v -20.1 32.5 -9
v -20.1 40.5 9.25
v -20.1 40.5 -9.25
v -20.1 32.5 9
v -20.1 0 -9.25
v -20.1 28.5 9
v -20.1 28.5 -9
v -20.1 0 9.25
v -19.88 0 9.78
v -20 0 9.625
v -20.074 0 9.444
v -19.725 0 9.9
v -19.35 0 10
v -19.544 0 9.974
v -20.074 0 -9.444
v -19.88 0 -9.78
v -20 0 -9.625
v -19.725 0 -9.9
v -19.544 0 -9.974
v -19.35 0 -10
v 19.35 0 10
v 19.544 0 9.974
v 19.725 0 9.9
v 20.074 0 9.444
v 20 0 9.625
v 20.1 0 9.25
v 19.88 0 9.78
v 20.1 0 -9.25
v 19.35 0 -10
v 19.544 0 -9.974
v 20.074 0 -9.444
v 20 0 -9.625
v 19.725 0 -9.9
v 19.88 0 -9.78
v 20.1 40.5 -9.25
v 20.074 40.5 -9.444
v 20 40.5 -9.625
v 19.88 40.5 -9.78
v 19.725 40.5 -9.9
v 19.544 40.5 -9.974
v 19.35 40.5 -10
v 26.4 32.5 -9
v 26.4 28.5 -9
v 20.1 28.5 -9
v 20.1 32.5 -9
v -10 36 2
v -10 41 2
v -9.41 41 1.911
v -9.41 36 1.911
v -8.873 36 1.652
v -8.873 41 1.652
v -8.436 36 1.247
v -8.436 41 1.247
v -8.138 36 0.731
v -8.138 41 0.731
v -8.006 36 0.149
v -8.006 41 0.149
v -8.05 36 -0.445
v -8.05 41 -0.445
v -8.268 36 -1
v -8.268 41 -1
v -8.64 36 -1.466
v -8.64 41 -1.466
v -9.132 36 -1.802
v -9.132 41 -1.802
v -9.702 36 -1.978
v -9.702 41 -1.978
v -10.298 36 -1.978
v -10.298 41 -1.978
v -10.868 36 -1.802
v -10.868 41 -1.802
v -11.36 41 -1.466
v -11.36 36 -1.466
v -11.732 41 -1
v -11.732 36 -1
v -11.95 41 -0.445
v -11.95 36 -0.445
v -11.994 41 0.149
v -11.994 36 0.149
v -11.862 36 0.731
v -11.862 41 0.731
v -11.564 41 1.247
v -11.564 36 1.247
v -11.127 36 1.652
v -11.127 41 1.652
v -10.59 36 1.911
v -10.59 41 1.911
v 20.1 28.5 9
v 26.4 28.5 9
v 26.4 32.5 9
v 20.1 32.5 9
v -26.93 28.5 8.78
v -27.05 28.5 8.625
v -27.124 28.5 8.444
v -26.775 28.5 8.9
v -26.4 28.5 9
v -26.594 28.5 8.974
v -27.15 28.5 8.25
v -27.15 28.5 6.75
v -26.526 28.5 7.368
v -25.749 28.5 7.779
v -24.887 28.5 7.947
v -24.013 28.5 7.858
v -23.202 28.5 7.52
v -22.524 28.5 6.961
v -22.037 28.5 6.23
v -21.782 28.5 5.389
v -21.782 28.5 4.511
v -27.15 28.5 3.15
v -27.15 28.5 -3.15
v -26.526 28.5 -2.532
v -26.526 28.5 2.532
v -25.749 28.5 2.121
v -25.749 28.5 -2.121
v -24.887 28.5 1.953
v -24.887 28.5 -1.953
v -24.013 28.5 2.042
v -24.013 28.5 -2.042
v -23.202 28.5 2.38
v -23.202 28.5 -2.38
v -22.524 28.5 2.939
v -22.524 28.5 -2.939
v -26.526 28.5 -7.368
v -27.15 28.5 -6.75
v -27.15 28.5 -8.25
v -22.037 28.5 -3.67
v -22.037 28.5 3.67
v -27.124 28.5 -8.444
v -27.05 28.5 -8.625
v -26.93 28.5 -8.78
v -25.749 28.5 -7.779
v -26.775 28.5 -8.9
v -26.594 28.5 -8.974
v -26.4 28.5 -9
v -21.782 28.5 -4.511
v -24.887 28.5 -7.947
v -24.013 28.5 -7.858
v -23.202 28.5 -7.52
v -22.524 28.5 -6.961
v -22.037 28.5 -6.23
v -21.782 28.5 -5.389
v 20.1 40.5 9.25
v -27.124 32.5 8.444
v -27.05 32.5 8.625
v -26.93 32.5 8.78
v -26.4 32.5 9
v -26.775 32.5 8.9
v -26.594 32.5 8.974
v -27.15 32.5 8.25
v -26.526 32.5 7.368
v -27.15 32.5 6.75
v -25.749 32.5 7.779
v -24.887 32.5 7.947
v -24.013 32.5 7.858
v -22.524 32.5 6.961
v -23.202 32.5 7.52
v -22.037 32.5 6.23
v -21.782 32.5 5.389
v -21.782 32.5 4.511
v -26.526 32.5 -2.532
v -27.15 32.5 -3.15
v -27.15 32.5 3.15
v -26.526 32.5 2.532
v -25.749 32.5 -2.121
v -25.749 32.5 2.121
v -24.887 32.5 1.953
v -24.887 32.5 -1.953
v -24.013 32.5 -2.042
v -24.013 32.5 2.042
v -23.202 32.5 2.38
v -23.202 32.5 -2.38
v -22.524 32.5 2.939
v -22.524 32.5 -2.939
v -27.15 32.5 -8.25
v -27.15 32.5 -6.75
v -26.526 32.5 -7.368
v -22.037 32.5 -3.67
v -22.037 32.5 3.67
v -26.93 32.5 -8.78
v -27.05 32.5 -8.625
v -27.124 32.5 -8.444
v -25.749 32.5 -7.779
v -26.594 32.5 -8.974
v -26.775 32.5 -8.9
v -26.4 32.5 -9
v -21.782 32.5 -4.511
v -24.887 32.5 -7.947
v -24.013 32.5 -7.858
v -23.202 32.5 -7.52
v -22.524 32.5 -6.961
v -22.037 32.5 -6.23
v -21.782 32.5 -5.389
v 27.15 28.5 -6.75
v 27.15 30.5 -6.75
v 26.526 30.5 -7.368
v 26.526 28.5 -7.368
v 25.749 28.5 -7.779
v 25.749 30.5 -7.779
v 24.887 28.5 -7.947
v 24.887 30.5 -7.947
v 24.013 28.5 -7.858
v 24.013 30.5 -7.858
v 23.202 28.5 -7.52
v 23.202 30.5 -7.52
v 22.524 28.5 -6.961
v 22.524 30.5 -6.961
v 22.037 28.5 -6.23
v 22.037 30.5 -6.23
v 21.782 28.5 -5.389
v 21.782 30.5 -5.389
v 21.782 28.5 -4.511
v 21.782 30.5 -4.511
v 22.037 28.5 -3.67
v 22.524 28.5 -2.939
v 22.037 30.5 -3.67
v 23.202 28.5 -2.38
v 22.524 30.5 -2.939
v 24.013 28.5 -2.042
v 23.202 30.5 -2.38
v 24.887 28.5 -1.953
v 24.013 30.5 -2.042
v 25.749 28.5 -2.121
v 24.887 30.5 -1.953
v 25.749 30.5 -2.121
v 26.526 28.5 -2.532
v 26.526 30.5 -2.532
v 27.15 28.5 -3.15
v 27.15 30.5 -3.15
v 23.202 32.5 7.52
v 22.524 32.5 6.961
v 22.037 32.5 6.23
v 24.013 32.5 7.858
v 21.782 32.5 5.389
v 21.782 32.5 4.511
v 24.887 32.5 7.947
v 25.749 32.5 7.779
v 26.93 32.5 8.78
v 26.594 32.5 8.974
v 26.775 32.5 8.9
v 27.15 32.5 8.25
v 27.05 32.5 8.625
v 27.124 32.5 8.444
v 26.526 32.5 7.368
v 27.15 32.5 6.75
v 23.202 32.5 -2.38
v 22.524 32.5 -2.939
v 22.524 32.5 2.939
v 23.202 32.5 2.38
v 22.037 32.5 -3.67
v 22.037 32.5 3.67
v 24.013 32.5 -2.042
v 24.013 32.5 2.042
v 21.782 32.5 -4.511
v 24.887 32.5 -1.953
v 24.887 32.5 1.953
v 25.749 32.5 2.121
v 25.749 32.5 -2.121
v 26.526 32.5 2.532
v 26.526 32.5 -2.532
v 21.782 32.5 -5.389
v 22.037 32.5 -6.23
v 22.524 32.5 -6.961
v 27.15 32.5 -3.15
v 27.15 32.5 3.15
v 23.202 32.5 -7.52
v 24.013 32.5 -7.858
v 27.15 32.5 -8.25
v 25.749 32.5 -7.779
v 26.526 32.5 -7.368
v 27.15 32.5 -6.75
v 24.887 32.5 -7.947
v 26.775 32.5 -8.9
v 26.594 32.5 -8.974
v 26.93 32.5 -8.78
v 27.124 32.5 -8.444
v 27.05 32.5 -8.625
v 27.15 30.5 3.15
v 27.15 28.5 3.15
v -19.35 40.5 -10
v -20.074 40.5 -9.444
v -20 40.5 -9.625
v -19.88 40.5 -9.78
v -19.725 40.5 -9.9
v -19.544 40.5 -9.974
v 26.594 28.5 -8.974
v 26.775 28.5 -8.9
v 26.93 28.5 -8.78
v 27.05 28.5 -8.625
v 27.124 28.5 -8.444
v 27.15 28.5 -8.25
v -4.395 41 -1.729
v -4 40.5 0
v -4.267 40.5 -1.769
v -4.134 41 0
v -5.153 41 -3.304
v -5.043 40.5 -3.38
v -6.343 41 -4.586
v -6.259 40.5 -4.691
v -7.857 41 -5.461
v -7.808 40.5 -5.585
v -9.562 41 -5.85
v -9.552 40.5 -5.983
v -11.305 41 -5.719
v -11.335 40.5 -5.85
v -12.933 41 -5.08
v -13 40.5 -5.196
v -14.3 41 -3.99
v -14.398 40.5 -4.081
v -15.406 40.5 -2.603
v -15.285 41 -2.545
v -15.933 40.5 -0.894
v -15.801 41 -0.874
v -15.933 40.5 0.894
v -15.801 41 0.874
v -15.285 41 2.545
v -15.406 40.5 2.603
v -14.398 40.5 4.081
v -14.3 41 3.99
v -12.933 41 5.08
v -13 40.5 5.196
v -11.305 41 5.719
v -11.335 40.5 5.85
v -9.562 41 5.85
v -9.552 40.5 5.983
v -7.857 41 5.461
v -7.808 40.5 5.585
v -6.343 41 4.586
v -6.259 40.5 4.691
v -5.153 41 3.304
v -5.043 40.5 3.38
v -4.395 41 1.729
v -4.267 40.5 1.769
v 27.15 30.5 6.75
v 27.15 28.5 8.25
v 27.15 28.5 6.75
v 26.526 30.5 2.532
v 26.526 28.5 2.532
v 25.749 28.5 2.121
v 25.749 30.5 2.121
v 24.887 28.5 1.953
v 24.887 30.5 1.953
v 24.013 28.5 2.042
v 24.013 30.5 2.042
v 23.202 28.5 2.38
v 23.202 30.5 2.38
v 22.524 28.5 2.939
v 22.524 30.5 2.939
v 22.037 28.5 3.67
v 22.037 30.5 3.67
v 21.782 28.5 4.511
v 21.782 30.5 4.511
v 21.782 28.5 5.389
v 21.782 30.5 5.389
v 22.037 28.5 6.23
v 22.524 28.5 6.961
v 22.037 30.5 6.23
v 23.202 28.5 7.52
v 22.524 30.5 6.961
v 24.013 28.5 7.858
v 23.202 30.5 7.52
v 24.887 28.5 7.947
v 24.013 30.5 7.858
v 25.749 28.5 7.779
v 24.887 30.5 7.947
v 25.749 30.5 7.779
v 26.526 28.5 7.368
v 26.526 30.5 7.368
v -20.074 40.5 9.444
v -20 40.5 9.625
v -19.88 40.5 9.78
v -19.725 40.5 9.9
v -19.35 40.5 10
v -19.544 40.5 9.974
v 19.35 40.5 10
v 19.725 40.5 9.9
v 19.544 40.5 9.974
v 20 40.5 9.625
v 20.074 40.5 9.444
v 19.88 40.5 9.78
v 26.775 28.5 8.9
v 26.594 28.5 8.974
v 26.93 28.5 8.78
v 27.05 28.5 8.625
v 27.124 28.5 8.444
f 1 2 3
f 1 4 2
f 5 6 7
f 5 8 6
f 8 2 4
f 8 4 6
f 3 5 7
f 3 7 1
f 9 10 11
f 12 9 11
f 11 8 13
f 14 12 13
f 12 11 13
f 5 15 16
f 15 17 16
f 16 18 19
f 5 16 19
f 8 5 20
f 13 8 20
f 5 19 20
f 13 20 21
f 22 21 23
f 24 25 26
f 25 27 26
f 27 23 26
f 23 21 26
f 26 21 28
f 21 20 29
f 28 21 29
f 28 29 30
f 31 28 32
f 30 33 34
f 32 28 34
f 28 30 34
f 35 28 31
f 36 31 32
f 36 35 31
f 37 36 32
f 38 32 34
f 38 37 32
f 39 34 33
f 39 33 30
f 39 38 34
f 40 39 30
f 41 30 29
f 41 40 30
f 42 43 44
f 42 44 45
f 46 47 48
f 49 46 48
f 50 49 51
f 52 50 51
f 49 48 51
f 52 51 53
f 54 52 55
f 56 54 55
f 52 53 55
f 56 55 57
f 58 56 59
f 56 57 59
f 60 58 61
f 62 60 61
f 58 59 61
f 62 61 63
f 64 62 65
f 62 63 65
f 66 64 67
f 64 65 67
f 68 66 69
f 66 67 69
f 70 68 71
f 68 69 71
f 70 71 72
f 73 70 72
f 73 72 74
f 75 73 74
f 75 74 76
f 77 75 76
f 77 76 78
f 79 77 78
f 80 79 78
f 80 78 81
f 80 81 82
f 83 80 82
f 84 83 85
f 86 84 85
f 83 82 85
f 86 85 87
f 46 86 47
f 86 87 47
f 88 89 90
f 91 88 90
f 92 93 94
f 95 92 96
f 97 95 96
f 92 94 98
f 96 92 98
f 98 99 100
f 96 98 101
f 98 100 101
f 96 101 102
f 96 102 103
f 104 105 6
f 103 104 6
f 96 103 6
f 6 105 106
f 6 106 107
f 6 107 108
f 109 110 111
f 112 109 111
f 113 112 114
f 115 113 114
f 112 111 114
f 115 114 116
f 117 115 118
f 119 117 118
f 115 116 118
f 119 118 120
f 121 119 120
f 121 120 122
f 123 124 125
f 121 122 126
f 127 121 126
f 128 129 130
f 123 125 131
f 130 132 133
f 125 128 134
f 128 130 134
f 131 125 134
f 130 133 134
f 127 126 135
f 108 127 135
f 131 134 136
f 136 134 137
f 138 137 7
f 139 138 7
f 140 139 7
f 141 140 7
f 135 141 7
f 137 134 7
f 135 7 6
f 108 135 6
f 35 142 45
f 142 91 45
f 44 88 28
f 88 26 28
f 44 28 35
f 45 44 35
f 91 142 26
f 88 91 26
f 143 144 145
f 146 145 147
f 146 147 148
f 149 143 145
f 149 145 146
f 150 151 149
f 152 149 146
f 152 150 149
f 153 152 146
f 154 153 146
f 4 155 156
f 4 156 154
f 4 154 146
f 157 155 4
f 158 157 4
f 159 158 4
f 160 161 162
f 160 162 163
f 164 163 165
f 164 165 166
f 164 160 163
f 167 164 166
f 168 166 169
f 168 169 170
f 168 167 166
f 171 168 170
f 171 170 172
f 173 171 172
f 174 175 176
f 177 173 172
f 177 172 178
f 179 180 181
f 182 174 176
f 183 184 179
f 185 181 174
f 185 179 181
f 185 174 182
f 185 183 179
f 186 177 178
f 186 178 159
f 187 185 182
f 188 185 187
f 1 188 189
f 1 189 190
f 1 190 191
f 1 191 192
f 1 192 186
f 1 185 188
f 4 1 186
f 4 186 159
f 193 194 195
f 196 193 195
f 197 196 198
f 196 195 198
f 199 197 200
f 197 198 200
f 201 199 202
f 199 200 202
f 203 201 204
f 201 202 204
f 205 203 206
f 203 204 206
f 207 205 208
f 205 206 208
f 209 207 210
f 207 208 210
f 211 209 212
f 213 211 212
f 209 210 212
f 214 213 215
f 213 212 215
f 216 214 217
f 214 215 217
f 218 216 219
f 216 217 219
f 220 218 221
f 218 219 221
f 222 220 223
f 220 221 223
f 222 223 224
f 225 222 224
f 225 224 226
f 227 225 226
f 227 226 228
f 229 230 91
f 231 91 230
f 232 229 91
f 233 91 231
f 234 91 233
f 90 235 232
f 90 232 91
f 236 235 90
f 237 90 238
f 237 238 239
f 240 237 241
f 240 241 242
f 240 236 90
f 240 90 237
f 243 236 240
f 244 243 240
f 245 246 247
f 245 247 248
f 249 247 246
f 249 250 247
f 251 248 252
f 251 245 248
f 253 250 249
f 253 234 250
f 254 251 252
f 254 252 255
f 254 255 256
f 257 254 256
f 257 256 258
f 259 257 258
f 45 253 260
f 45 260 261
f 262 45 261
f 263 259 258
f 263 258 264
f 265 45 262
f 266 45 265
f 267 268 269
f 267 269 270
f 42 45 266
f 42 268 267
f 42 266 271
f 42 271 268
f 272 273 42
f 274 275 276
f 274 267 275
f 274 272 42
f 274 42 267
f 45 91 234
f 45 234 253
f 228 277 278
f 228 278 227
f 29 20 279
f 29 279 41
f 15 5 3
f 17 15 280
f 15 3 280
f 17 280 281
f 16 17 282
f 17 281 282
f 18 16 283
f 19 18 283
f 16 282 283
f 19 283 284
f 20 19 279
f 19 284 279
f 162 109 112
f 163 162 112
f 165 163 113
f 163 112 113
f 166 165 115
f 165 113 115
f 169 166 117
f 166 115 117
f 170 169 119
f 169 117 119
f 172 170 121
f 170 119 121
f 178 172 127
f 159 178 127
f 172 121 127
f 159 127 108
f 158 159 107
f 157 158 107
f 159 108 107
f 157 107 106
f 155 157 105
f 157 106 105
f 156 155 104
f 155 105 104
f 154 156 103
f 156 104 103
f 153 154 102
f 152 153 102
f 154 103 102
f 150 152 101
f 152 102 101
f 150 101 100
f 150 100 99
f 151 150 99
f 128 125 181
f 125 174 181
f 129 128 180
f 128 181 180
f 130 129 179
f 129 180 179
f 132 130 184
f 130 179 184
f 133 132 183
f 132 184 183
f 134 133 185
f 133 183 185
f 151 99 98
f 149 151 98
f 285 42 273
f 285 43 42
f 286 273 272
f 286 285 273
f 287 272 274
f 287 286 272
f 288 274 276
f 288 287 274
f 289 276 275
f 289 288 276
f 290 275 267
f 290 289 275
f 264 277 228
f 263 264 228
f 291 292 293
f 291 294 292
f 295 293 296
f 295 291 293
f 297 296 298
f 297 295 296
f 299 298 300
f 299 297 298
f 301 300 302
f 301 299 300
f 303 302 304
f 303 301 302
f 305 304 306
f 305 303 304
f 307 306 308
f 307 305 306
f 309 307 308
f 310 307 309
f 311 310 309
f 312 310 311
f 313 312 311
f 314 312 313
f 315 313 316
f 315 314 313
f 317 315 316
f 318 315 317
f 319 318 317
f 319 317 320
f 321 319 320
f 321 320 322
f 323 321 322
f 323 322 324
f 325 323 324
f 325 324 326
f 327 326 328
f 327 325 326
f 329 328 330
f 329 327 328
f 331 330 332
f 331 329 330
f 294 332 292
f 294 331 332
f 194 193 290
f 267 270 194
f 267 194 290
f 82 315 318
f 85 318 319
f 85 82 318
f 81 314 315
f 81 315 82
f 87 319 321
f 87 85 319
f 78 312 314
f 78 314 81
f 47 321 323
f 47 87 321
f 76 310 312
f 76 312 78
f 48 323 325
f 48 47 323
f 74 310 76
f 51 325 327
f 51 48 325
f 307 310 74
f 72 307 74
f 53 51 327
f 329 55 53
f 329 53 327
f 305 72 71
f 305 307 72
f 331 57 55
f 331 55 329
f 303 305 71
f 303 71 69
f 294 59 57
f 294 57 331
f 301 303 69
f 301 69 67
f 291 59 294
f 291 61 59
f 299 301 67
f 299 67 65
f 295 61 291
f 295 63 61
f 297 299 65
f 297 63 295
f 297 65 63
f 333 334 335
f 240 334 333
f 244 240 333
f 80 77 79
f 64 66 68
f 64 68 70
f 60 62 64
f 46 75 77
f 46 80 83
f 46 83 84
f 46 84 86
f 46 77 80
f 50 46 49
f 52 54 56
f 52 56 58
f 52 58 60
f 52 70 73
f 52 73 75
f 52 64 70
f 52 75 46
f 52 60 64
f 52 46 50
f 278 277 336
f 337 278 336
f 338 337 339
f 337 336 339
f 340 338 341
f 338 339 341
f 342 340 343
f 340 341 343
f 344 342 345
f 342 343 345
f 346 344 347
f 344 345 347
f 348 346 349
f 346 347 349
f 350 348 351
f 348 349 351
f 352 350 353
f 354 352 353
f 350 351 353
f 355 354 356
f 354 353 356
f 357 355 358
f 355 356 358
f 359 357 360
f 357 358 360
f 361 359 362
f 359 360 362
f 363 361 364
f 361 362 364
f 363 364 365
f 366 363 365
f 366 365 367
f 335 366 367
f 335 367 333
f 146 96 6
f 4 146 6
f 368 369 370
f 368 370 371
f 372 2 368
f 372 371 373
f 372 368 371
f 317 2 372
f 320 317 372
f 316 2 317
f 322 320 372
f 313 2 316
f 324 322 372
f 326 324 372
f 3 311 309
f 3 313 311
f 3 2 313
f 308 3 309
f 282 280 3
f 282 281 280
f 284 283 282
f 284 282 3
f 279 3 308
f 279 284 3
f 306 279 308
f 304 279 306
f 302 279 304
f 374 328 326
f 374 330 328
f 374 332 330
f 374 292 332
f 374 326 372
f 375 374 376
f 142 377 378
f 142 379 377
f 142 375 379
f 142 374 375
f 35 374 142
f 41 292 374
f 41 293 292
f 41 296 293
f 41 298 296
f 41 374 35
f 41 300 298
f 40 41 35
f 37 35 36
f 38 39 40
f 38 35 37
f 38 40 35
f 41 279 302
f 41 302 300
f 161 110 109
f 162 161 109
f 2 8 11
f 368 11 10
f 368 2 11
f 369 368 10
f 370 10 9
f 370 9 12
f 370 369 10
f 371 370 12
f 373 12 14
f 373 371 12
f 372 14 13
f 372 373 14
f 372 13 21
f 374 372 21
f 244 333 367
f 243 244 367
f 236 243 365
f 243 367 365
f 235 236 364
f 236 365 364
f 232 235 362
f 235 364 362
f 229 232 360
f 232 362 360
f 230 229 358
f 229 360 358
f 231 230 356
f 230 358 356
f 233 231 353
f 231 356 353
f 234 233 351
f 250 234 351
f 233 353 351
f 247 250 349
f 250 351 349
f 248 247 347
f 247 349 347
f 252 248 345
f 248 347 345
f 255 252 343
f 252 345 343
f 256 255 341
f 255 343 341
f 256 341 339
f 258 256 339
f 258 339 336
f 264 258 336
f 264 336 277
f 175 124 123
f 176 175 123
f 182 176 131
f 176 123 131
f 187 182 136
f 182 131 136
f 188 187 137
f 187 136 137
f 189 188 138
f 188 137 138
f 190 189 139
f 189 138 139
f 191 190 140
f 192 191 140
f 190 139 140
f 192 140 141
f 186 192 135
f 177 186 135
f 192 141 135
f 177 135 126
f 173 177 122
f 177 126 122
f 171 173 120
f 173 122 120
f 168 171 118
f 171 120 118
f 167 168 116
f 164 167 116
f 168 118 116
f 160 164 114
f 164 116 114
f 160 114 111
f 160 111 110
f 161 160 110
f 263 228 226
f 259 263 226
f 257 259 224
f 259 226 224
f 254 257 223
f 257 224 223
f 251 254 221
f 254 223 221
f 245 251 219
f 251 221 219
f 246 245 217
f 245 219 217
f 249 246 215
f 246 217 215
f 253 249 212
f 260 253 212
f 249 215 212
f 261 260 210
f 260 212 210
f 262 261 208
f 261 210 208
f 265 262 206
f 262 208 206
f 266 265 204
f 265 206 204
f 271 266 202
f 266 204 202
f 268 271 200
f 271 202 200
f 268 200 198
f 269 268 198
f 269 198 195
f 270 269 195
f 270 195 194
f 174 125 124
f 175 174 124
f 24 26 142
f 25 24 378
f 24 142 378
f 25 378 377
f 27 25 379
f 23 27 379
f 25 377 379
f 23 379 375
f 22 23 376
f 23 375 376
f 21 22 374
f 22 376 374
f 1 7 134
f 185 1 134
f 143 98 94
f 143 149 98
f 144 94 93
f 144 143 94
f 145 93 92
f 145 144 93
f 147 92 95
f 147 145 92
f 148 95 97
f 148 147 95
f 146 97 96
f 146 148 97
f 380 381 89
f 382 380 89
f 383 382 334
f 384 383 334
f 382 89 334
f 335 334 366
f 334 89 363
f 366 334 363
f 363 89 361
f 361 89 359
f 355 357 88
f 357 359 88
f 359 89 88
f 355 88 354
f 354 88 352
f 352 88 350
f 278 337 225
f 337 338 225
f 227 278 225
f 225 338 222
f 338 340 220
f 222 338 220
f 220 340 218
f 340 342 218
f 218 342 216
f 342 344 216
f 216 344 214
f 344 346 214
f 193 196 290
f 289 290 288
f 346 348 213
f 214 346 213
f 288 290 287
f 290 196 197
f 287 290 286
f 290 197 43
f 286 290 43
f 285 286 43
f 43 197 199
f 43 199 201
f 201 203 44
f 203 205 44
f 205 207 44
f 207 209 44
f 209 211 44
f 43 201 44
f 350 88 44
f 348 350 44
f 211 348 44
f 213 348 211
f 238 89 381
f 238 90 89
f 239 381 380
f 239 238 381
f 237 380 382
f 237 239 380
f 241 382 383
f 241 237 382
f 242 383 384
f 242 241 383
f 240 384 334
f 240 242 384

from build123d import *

# Parameters (mm, degrees)
SKETCH1_W           = 40.2
SKETCH1_H           = 20
BOSS_EXTRUDE1_DEPTH = 40.5
SKETCH2_W           = 18
SKETCH2_H           = 2
BOSS_EXTRUDE2_DEPTH = 7.05
SKETCH5_R           = 3
CUT_EXTRUDE1_DEPTH  = 7.05
MIRROR2_START       = 28.5
MIRROR2_DEPTH       = 4
FILLET2_R           = 0.75
SKETCH6_R           = 6
BOSS_EXTRUDE3_DEPTH = 0.5
BOSS_EXTRUDE3_TAPER = 15
SKETCH7_R           = 2
CUT_EXTRUDE3_DEPTH  = 5


# Read off the part's stored shape, not the designer's step: Mirror2
with BuildPart() as part:
    # Sketch1 → Boss-Extrude1 (new body)
    with BuildSketch(Plane(origin=(0, 0, 0), x_dir=(1, 0, 0), z_dir=(0, 1, 0))):
        Rectangle(SKETCH1_W, SKETCH1_H)
    extrude(amount=BOSS_EXTRUDE1_DEPTH)

    # Sketch2 → Boss-Extrude2 (add)
    with BuildSketch(Plane(origin=(20.1, 0, 0), x_dir=(0, 0, -1), z_dir=(1, 0, 0))):
        with Locations((0, 29.5)):
            Rectangle(SKETCH2_W, SKETCH2_H)
    extrude(amount=BOSS_EXTRUDE2_DEPTH)

    # Sketch5 → Cut-Extrude1 (cut)
    with BuildSketch(Plane(origin=(0, 30.5, 0), x_dir=(1, 0, 0), z_dir=(0, 1, 0))):
        with Locations((24.75, 4.95)):
            Circle(SKETCH5_R)
        with Locations((24.75, -4.95)):
            Circle(SKETCH5_R)
    extrude(amount=-CUT_EXTRUDE1_DEPTH, mode=Mode.SUBTRACT)

    # Mirror2 outline → Mirror2 (add)
    with BuildSketch(Plane(origin=(0, 0, 0), x_dir=(1, 0, 0), z_dir=(0, 1, 0)).offset(MIRROR2_START)):
        with BuildLine():
            Line((-27.15, 3.15), (-27.15, -3.15))
            ThreePointArc((-27.15, -3.15), (-21.75, -4.95), (-27.15, -6.75))
            Line((-27.15, -6.75), (-27.15, -9))
            Line((-27.15, -9), (-20.1, -9))
            Line((-20.1, -9), (-20.1, 9))
            Line((-20.1, 9), (-27.15, 9))
            Line((-27.15, 9), (-27.15, 6.75))
            ThreePointArc((-27.15, 6.75), (-21.75, 4.95), (-27.15, 3.15))
        make_face()
        with BuildLine():
            Line((27.15, 6.75), (27.15, 9))
            Line((27.15, 9), (20.1, 9))
            Line((20.1, 9), (20.1, -9))
            Line((20.1, -9), (27.15, -9))
            Line((27.15, -9), (27.15, -6.75))
            ThreePointArc((27.15, -6.75), (21.75, -4.95), (27.15, -3.15))
            Line((27.15, -3.15), (27.15, 3.15))
            ThreePointArc((27.15, 3.15), (21.75, 4.95), (27.15, 6.75))
        make_face()
    extrude(amount=MIRROR2_DEPTH)

    # Fillet2
    fillet2_edges = [part.edges().sort_by_distance(p)[0] for p in [
        (27.15, 30.5, 9),
        (27.15, 30.5, -9),
        (-27.15, 30.5, 9),
        (-27.15, 30.5, -9),
        (20.1, 20.25, 10),
        (-20.1, 20.25, 10),
        (-20.1, 20.25, -10),
        (20.1, 20.25, -10),
    ]]
    fillet(fillet2_edges, radius=FILLET2_R)

    # Sketch6 → Boss-Extrude3 (add)
    with BuildSketch(Plane(origin=(0, 40.5, 0), x_dir=(1, 0, 0), z_dir=(0, 1, 0))):
        with Locations((-10, 0)):
            Circle(SKETCH6_R)
    extrude(amount=BOSS_EXTRUDE3_DEPTH, taper=BOSS_EXTRUDE3_TAPER)

    # Sketch7 → Cut-Extrude3 (cut)
    with BuildSketch(Plane(origin=(0, 41, 0), x_dir=(1, 0, 0), z_dir=(0, 1, 0))):
        with Locations(Location((-10, 0, 0), (0, 0, 270))):
            Circle(SKETCH7_R)
    extrude(amount=-CUT_EXTRUDE3_DEPTH, mode=Mode.SUBTRACT)


solid = part.part
